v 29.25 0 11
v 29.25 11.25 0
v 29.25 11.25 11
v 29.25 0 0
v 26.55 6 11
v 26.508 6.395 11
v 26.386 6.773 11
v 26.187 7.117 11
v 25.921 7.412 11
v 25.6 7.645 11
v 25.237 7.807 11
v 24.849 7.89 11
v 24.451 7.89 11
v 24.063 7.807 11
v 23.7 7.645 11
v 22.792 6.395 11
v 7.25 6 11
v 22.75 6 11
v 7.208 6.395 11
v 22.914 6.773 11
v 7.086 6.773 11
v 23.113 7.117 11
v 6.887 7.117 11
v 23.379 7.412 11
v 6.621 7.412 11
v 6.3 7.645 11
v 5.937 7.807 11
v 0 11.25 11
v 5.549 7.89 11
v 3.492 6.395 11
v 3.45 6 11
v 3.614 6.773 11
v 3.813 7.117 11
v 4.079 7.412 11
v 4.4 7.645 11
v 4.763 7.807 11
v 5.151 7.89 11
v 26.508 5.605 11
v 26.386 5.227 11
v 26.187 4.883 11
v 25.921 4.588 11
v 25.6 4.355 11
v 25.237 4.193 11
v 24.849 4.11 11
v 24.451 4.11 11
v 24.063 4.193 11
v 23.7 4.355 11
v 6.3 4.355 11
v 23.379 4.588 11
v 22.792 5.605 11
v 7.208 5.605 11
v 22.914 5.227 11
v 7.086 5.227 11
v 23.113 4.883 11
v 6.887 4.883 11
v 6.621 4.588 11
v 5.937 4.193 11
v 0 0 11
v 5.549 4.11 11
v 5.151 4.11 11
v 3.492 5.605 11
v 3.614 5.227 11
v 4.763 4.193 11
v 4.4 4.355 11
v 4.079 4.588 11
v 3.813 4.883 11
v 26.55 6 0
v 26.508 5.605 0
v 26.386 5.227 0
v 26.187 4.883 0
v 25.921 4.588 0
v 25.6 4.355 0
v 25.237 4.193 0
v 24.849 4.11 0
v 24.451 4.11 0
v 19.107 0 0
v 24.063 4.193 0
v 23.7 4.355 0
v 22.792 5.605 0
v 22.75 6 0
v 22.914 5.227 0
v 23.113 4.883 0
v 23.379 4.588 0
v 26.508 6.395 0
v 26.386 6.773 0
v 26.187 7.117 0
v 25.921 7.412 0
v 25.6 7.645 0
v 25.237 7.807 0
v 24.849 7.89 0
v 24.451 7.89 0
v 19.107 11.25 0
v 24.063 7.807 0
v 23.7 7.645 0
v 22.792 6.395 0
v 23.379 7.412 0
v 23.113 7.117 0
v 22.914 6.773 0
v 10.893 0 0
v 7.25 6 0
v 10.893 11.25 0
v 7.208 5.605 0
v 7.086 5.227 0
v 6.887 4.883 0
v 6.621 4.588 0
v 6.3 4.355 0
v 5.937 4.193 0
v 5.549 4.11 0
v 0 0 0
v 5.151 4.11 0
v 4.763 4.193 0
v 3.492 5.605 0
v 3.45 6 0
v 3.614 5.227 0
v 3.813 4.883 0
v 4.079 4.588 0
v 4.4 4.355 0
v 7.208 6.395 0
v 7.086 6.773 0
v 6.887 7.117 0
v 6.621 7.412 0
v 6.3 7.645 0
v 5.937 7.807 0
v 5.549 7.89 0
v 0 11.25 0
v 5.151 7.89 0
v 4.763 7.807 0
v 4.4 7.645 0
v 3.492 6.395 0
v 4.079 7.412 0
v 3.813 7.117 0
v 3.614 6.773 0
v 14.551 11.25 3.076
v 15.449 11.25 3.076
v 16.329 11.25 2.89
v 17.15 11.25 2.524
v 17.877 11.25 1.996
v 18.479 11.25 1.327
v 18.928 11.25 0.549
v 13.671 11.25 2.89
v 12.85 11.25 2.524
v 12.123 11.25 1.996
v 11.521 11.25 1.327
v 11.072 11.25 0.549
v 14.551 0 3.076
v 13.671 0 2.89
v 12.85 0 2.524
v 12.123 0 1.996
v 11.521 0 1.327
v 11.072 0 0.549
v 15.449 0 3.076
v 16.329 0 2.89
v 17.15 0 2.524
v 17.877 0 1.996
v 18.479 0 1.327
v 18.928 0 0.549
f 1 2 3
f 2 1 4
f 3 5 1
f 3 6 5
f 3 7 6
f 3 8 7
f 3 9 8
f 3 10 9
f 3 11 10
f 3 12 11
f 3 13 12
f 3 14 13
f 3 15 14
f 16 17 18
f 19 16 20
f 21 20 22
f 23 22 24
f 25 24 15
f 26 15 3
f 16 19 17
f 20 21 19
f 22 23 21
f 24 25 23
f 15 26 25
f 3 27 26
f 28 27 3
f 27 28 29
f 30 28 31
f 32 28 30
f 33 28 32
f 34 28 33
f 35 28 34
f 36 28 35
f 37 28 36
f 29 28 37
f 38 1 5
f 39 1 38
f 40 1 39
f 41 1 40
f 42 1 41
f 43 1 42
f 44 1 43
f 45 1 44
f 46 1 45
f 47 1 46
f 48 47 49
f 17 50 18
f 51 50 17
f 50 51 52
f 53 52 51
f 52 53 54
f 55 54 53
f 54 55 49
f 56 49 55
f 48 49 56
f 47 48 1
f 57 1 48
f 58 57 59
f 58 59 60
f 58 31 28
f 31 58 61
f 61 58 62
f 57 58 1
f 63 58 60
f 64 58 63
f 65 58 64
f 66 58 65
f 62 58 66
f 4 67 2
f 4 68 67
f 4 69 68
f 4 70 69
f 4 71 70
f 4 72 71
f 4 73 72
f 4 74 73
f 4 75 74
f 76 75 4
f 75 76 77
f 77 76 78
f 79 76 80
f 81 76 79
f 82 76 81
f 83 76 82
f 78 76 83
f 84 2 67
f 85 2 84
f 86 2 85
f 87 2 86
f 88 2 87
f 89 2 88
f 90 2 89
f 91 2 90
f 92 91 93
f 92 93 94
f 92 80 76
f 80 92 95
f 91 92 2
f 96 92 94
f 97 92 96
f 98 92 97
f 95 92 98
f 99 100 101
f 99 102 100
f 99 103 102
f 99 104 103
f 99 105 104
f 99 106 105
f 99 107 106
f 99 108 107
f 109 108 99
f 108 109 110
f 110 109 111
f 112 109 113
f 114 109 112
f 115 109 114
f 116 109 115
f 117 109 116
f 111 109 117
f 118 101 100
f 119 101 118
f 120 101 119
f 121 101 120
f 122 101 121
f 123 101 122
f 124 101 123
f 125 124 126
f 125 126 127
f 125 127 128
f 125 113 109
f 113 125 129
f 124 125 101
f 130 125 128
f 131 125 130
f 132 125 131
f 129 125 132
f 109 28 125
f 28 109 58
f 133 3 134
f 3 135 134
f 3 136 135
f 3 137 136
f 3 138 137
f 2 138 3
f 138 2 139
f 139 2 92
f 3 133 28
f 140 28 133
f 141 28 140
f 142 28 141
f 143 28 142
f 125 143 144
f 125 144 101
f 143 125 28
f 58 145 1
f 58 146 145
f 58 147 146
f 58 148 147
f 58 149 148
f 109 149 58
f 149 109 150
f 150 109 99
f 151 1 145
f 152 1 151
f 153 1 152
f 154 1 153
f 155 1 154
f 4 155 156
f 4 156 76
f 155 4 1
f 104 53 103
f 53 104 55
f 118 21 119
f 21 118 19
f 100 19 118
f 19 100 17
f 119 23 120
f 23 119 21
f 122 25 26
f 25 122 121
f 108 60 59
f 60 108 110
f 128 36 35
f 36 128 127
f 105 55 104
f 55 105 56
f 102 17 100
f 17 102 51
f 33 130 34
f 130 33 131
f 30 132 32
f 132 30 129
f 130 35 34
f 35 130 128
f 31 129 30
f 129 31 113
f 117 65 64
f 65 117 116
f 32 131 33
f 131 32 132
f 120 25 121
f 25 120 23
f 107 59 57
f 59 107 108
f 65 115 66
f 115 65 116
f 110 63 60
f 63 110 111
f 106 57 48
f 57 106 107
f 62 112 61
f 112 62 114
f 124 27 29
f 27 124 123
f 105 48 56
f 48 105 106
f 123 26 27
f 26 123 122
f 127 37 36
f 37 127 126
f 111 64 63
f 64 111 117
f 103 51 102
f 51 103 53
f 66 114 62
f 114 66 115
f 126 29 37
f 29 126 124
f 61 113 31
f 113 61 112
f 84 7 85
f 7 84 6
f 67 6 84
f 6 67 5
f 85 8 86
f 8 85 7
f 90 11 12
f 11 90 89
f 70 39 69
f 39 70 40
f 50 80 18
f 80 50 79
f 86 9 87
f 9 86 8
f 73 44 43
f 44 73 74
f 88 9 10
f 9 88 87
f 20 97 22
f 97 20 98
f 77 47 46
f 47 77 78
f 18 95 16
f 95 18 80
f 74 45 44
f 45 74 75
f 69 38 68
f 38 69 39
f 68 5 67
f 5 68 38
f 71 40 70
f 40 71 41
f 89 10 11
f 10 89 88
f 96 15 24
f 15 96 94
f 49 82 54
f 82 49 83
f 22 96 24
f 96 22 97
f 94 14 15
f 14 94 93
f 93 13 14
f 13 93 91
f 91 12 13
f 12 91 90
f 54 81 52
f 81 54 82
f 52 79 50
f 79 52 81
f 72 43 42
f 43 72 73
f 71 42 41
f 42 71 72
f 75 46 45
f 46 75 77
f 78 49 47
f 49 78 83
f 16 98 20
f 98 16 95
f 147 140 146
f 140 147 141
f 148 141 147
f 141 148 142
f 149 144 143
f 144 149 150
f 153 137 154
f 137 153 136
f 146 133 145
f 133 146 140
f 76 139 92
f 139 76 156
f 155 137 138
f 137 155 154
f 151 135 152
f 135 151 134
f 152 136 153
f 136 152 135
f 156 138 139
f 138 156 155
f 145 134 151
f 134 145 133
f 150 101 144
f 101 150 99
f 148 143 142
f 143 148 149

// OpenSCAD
// file: shared_variables.scad
// sled
sled_length = 29.5;
sled_width = 34.5;
sled_x_distance = 17.5;
sled_y_distance = 23.5;
sled_screw_hole_diameter = 4.5;
sled_screw_head_diameter = 8.2;
sled_screw_head_th = 3;

// nema 17 stepper motor
motor_width = 45;
motor_mount_height = 40;

// roundbar
axle_holder_width = 30;
axle_set_depth = 12;
roundbar_diameter = 8 + 0.6;
axle_mount_hole_center = (axle_holder_width - roundbar_diameter) / 4;
axle_fastener_height = 11;

// axle_bearing
bearing_diameter = 22;
bearing_thickness = 8;
bearing_mount_width = bearing_diameter + 16;

// general
y_axle_distance = 30;
bottom_th = 8;
wall_th = 8;
sled_clearing_distance = 10 + 2;
motor_backset = 30;
axle_height = 20;
motor_mount_width = motor_width / 2 + y_axle_distance + axle_holder_width / 2;
m3_hole_d = 3.8;
// main file
include <shared_variables.scad>

$fn = 30;

difference() {
    cube([axle_holder_width-0.75, axle_set_depth-0.75, axle_fastener_height]);
    translate([axle_mount_hole_center, axle_set_depth / 2, 0]) cylinder(d = m3_hole_d, h = axle_fastener_height);
    translate([axle_holder_width - axle_mount_hole_center, axle_set_depth / 2, 0]) cylinder(d = m3_hole_d, h = axle_fastener_height);
    translate([axle_holder_width / 2, 0, -1.2]) rotate([270, 0, 0]) cylinder(d = roundbar_diameter, h = 33);

}
